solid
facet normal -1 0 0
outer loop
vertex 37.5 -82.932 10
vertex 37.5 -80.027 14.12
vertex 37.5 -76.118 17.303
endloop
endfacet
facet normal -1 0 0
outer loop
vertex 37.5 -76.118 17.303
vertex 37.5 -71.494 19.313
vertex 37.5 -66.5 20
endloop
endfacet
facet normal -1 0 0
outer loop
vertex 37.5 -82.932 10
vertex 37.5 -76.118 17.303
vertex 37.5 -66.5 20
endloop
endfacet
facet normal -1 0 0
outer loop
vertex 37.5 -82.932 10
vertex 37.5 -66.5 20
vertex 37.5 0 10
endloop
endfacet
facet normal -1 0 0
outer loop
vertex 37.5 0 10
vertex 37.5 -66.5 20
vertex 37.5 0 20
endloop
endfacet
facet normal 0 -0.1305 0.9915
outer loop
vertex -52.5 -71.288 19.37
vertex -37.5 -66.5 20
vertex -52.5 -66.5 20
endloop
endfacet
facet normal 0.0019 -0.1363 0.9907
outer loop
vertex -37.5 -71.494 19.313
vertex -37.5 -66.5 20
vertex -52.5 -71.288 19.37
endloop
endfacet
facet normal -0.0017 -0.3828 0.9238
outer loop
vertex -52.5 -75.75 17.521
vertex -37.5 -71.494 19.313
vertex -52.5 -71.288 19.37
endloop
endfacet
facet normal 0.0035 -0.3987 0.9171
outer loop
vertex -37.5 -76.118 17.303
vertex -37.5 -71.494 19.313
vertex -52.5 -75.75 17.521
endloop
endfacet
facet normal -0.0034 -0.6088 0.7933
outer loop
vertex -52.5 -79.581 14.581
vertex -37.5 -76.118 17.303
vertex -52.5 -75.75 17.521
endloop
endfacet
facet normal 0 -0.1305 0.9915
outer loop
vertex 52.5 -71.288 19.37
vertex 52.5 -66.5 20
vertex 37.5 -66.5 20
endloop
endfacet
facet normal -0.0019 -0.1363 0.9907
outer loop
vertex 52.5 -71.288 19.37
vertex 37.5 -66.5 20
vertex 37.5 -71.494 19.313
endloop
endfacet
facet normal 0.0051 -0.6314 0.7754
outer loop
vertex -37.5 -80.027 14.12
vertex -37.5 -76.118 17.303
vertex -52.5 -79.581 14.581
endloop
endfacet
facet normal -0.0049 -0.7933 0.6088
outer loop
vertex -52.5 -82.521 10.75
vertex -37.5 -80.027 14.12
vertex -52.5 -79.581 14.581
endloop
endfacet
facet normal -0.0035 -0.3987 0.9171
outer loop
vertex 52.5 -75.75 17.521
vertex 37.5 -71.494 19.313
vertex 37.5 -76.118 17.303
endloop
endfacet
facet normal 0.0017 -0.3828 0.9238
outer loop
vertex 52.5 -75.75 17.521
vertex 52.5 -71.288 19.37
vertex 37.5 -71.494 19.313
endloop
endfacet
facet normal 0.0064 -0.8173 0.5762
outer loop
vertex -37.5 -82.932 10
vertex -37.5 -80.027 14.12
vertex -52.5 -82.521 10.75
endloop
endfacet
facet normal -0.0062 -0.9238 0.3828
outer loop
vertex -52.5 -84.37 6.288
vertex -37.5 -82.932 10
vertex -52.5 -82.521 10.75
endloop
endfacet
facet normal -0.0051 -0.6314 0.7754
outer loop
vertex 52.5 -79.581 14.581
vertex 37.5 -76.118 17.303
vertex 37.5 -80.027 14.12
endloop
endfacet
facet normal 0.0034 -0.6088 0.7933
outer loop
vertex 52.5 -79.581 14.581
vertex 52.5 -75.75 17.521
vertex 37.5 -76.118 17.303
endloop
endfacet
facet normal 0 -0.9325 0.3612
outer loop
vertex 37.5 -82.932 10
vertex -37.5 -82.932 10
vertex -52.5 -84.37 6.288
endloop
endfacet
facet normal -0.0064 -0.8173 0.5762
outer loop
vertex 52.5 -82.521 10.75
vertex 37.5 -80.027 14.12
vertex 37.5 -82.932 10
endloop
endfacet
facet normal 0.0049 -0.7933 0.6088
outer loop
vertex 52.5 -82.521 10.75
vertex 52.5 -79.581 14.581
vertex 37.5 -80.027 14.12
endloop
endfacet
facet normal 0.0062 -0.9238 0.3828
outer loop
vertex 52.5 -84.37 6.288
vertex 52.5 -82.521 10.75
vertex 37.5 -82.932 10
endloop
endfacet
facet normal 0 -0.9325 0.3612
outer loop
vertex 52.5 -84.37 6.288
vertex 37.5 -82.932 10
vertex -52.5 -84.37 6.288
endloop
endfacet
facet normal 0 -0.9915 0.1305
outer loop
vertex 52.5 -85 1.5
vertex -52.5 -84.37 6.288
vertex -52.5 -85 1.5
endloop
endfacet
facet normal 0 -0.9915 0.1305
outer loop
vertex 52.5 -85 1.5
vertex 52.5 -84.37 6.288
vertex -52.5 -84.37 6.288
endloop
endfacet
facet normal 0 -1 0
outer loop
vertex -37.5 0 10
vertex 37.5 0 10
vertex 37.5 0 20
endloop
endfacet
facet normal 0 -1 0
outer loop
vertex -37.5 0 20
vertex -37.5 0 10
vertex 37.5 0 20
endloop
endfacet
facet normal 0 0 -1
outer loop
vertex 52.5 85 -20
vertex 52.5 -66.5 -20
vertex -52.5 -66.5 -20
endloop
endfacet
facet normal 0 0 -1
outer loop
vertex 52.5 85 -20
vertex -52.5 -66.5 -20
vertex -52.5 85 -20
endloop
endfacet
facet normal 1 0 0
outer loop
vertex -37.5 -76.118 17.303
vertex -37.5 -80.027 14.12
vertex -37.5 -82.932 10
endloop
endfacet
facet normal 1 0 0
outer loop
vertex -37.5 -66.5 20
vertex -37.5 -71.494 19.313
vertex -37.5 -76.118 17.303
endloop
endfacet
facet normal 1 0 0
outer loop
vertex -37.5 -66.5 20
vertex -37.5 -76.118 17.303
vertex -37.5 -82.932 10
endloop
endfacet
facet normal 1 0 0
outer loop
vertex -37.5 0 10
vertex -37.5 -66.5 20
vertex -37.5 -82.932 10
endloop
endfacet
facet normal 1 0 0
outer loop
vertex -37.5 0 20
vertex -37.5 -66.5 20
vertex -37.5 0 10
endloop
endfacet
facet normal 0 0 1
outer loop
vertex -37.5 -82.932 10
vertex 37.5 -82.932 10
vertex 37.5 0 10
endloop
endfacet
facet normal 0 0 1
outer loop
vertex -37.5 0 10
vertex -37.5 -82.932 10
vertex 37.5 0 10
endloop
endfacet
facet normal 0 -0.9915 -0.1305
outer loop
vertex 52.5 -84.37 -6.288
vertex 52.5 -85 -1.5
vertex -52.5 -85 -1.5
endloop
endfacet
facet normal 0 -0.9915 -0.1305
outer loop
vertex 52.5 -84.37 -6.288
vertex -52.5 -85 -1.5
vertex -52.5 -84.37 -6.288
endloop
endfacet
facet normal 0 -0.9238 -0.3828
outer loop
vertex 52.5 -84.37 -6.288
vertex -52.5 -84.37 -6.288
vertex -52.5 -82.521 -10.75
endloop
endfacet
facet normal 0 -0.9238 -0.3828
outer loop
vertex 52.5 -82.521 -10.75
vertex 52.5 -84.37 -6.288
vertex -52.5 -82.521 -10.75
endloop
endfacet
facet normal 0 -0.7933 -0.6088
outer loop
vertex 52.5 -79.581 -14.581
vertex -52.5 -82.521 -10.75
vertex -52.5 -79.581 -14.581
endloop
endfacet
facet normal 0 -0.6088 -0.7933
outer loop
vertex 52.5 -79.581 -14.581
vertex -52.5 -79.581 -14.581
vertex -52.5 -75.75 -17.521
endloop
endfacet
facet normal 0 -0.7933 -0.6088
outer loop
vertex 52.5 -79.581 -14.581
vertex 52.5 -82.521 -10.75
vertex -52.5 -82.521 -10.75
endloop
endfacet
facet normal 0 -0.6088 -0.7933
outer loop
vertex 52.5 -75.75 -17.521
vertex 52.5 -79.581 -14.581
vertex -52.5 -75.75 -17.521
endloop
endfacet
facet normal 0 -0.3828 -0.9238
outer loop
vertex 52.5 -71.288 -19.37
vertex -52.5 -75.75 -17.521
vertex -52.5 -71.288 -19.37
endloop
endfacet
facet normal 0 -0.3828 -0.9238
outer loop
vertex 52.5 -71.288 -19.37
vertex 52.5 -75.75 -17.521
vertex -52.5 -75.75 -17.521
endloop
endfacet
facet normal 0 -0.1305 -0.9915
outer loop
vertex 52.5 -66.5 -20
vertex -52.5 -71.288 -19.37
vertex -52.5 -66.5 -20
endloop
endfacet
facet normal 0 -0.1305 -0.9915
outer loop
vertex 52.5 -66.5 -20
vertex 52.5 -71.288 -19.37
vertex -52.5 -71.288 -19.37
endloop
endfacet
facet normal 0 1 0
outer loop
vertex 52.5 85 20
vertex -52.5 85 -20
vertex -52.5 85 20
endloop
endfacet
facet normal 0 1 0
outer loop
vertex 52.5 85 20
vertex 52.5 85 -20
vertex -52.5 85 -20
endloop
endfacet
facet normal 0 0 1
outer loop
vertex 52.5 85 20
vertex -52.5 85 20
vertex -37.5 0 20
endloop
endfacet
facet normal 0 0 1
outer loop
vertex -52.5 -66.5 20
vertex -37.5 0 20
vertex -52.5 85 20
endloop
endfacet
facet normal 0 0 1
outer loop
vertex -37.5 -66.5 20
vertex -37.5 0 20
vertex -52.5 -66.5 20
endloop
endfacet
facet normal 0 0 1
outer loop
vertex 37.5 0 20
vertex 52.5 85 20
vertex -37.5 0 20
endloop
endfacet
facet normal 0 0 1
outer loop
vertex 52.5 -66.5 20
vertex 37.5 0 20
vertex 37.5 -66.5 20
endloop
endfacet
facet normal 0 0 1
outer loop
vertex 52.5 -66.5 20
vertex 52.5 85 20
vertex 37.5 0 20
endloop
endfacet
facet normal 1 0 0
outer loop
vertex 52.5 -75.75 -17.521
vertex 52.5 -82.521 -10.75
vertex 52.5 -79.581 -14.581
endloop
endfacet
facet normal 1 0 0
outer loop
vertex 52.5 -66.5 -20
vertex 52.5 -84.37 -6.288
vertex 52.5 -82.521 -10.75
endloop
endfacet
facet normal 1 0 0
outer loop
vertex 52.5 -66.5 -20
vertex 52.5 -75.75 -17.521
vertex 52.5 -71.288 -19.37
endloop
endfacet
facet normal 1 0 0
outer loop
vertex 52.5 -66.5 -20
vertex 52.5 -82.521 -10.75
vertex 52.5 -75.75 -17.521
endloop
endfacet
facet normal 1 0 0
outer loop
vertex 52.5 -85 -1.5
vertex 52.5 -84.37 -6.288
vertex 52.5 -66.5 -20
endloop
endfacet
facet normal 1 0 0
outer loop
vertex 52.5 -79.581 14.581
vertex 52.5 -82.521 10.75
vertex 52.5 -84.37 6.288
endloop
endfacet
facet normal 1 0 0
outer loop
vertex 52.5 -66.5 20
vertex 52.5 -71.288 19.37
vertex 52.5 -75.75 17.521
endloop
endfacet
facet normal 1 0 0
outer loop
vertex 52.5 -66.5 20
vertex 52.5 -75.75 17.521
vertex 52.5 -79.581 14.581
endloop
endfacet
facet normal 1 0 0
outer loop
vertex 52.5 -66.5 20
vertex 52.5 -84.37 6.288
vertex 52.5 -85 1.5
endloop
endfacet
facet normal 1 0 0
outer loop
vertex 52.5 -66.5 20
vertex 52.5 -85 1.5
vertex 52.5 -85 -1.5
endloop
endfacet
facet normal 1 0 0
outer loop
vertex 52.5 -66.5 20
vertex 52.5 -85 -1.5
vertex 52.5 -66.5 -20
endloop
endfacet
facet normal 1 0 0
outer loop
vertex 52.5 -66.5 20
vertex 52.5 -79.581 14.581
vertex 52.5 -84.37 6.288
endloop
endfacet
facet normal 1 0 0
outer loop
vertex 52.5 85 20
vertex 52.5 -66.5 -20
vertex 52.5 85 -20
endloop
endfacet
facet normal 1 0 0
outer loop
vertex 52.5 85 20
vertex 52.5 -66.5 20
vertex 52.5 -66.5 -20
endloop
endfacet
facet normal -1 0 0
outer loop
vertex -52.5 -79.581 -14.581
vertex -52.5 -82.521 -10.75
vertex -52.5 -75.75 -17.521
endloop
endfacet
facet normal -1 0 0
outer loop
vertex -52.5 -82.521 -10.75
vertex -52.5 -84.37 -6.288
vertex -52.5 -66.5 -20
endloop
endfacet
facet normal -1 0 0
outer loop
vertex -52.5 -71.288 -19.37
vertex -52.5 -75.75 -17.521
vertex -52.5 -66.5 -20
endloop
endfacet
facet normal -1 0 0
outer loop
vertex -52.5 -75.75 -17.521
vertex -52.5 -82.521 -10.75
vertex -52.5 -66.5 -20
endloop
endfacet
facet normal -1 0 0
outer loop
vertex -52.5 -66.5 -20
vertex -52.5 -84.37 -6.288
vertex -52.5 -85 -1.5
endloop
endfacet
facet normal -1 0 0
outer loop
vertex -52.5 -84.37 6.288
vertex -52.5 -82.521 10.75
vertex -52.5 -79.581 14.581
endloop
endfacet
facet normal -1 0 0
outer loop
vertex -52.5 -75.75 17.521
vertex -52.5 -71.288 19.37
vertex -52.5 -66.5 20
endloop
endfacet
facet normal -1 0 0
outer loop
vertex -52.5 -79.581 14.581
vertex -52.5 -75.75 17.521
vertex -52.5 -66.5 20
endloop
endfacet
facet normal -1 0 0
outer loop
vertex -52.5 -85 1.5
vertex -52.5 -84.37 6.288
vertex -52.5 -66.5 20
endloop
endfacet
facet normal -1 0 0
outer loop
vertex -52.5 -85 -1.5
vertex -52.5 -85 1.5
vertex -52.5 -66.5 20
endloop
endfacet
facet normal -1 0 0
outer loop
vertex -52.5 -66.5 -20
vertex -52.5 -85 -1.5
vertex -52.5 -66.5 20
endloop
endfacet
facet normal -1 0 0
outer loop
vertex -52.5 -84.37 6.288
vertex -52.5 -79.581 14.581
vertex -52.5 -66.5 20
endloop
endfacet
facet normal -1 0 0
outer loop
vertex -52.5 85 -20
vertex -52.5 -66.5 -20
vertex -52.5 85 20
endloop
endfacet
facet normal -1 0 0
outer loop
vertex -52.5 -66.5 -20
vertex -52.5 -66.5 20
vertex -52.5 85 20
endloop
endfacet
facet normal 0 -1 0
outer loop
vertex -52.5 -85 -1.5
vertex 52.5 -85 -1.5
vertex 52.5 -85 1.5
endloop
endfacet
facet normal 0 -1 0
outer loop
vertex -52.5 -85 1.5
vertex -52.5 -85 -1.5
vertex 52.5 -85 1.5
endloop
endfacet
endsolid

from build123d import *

# Parameters (mm, degrees)
F0_W     = 170
F0_H     = 3
F1_DEPTH = 52.5
F2_W     = 85
F2_H     = 10
F3_DEPTH = 37.5


with BuildPart() as f1:
    # F0 (on Right) → F1 (new body, symmetric)
    with BuildSketch(Plane.YZ):
        with BuildLine():
            ThreePointArc((-66.5, 20), (-79.581475, 14.581475), (-85, 1.5))
            Line((-85, 1.5), (85, 1.5))
            Line((85, 1.5), (85, 20))
            Line((85, 20), (-66.5, 20))
        make_face()
        Rectangle(F0_W, F0_H)
        with BuildLine():
            Line((85, -1.5), (-85, -1.5))
            ThreePointArc((-85, -1.5), (-79.581475, -14.581475), (-66.5, -20))
            Line((-66.5, -20), (85, -20))
            Line((85, -20), (85, -1.5))
        make_face()
    extrude(amount=F1_DEPTH, both=True)

    # F2 (on Right) → F3 (cut, symmetric)
    with BuildSketch(Plane.YZ):
        with Locations((-42.5, 15)):
            Rectangle(F2_W, F2_H)
    extrude(amount=F3_DEPTH, both=True, mode=Mode.SUBTRACT)


solid = f1.part
